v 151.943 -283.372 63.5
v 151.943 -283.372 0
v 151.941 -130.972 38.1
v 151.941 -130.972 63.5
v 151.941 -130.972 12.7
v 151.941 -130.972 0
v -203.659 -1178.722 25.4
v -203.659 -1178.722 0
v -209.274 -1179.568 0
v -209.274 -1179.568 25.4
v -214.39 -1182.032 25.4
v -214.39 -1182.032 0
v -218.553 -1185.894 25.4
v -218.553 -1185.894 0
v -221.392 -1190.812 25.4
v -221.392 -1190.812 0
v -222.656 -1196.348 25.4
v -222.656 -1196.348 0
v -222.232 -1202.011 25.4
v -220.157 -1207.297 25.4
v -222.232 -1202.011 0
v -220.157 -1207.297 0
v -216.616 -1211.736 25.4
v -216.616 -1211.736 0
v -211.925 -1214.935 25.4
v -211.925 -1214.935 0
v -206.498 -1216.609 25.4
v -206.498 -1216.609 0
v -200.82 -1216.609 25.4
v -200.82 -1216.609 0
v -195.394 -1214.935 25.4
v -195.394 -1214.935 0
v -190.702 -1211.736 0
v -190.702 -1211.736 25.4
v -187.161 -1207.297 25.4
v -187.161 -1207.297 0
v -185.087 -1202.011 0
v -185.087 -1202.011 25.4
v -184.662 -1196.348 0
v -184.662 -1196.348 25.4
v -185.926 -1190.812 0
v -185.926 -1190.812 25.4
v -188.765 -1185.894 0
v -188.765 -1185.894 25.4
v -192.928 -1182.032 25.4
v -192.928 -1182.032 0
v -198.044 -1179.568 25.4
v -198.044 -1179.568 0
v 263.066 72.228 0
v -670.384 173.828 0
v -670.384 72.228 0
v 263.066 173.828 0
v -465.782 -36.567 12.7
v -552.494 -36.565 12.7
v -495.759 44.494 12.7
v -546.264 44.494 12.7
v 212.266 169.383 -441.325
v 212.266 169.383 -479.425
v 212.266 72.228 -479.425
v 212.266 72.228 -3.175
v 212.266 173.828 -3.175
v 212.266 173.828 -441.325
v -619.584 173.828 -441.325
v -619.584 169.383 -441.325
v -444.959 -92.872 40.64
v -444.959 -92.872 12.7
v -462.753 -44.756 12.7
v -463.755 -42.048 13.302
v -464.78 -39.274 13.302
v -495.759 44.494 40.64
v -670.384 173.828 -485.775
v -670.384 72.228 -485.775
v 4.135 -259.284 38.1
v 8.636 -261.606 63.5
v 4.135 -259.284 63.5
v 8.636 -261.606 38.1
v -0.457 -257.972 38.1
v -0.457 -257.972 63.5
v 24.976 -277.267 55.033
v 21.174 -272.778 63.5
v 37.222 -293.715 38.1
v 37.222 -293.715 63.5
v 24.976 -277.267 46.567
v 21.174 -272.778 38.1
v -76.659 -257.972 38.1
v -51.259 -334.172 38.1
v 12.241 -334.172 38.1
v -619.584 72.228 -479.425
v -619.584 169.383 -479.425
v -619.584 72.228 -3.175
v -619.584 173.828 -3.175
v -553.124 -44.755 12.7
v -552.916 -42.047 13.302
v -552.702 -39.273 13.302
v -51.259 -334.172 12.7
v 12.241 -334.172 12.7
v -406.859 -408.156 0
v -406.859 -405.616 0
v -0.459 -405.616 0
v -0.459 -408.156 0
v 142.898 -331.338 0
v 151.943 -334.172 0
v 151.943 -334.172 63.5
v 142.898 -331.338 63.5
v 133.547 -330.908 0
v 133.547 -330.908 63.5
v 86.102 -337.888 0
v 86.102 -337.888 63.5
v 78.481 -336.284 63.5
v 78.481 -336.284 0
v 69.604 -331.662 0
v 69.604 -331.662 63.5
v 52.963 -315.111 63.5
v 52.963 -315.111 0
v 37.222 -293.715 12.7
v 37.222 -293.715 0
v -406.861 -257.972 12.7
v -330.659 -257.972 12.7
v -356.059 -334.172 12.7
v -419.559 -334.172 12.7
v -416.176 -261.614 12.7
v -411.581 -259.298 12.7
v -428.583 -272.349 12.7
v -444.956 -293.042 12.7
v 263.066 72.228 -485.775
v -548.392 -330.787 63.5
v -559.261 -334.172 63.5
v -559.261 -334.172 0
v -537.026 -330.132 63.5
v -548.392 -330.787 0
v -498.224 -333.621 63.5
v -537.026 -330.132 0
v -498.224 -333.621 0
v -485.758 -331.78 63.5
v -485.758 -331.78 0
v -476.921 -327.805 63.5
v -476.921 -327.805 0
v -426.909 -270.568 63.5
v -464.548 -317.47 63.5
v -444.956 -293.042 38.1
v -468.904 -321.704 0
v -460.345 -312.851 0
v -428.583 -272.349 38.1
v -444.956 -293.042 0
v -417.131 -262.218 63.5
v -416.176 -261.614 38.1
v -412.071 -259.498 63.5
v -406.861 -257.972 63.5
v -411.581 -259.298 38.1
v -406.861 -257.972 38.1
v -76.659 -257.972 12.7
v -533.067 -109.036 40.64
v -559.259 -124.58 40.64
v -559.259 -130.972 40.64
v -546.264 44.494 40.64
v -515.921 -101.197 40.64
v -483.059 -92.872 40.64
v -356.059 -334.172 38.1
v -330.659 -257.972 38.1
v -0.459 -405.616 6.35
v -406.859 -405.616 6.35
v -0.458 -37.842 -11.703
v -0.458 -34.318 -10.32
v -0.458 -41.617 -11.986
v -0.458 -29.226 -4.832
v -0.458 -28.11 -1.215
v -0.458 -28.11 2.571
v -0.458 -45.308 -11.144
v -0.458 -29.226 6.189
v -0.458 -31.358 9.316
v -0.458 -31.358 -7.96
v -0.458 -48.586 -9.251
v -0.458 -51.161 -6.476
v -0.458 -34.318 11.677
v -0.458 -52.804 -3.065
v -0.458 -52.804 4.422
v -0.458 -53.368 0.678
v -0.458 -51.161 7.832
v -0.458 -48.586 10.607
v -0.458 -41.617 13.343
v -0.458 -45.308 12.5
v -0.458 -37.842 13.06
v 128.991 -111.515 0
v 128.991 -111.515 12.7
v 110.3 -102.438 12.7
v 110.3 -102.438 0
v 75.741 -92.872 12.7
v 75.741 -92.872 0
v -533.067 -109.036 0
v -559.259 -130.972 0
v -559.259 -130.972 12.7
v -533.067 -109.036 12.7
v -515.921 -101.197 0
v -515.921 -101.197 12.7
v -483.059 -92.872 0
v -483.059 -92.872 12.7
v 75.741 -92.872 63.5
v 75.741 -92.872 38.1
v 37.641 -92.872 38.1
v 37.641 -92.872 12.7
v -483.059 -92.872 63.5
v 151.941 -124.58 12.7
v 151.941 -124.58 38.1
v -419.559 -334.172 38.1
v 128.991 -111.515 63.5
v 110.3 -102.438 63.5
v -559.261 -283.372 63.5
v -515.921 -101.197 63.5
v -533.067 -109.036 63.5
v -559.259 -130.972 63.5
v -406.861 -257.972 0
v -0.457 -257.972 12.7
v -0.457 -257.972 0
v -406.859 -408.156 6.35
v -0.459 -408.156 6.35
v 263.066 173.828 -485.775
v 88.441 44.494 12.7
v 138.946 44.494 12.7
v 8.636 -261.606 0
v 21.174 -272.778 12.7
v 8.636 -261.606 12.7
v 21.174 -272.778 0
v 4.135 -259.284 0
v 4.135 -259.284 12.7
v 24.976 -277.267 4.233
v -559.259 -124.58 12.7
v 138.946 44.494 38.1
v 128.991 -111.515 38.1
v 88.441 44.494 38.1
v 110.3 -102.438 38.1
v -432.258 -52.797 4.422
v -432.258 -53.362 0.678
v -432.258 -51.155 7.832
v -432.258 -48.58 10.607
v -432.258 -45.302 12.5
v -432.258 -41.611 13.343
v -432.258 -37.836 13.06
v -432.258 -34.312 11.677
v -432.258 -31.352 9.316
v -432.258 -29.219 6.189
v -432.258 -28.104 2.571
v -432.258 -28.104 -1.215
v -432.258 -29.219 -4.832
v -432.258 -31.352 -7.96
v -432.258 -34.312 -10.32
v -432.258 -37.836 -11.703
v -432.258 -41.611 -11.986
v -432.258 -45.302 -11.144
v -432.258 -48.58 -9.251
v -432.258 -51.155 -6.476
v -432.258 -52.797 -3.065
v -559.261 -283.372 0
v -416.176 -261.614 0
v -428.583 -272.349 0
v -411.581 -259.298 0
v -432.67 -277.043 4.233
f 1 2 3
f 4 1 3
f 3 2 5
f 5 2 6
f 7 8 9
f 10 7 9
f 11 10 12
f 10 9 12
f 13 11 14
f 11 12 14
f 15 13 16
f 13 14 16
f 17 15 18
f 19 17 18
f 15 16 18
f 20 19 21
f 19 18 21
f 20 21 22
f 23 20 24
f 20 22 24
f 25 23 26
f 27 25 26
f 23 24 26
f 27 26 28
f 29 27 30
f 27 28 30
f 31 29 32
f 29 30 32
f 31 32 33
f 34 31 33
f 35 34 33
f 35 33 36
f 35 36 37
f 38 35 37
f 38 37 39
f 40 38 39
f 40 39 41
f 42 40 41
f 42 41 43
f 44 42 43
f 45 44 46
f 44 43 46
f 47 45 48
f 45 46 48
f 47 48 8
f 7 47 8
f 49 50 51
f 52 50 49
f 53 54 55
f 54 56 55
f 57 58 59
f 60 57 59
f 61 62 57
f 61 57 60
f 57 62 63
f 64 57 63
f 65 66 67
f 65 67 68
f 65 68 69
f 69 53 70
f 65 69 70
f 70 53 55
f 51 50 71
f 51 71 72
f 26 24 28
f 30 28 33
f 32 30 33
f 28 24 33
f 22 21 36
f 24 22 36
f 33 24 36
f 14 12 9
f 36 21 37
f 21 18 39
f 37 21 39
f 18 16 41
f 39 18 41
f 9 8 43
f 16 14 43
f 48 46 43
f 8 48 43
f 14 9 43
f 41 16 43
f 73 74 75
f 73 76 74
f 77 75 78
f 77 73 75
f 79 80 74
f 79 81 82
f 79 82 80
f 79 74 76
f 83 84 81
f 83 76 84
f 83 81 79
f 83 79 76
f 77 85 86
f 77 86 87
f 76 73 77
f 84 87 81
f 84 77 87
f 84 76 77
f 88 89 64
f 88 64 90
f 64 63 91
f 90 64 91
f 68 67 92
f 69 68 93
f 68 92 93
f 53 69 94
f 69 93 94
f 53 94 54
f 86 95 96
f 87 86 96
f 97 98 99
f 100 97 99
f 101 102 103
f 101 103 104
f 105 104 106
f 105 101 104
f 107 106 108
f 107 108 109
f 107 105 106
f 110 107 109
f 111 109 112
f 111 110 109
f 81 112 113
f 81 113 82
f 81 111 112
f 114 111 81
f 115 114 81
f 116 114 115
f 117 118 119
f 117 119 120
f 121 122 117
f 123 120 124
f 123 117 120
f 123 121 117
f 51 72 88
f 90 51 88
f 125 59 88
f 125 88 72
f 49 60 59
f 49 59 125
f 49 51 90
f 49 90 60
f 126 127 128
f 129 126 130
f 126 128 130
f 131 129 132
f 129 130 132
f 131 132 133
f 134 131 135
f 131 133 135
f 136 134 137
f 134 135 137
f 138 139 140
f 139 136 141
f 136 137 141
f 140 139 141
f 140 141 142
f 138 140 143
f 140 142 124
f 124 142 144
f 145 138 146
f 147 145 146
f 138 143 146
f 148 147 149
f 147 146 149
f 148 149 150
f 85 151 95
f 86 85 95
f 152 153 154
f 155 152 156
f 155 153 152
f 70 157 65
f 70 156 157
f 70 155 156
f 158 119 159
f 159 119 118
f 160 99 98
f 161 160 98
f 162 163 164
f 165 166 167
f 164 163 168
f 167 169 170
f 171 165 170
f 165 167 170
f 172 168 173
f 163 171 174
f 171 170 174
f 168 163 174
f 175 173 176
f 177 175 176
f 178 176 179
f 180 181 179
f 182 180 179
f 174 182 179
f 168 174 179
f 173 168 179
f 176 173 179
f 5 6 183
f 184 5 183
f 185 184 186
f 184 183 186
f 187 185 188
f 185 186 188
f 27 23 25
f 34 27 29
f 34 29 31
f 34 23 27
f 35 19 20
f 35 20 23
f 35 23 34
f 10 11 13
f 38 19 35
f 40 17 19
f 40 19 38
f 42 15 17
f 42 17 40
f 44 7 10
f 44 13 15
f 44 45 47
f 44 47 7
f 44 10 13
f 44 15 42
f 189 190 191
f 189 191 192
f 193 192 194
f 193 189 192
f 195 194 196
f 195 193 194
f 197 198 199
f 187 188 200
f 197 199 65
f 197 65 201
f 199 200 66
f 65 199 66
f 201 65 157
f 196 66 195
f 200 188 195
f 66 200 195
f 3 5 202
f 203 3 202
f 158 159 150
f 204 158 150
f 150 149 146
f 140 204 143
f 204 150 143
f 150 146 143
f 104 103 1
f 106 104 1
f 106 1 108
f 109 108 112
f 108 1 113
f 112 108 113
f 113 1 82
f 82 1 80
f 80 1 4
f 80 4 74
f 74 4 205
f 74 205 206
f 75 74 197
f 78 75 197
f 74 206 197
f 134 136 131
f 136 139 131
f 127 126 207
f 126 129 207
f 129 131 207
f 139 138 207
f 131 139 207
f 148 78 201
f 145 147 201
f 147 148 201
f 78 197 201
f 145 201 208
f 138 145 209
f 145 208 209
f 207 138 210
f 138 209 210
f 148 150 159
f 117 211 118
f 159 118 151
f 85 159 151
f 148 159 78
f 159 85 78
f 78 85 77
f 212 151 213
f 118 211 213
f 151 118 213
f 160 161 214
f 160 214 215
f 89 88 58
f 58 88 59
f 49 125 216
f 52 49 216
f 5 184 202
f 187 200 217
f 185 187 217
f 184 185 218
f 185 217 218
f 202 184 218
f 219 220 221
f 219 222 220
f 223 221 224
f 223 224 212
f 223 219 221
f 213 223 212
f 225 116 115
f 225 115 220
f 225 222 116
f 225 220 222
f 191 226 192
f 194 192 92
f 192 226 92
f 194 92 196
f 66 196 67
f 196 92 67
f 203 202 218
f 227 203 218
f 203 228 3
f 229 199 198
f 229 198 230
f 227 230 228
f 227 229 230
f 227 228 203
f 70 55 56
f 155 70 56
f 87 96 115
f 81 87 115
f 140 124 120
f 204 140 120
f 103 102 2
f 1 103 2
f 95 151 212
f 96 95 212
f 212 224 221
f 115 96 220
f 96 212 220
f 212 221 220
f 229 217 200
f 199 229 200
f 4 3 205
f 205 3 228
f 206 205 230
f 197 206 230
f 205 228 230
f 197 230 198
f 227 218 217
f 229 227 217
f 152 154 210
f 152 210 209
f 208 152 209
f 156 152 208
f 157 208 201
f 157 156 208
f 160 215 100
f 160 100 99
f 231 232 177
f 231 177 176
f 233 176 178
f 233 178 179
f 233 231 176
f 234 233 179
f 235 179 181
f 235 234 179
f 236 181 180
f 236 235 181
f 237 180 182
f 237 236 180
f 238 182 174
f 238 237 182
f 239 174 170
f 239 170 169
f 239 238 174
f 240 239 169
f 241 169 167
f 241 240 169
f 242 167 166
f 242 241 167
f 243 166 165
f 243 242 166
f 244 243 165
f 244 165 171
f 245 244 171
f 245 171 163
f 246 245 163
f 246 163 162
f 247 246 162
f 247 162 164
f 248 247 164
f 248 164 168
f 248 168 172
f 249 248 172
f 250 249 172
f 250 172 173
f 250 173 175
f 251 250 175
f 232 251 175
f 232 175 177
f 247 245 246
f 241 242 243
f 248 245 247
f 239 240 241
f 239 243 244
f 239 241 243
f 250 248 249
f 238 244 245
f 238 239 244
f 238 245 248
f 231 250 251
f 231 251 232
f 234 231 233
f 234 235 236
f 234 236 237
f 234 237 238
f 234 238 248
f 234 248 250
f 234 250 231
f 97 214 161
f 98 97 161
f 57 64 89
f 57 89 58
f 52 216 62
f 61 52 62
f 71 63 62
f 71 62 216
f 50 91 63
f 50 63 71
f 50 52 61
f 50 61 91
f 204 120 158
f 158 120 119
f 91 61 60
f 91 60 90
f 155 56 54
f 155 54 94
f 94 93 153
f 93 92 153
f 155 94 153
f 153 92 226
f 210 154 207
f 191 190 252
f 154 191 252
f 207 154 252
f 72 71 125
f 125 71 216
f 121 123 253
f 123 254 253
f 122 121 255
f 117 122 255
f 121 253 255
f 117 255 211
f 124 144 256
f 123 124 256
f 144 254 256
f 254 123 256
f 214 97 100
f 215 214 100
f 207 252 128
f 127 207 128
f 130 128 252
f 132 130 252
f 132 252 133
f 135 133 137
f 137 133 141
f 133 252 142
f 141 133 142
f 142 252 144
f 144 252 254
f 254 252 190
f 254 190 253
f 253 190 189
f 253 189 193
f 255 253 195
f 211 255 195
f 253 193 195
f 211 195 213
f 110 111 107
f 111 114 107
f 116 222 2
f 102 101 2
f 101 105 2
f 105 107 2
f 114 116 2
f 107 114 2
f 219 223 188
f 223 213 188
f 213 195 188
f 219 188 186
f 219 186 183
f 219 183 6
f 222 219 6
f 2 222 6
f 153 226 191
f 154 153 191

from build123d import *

# Parameters (mm, degrees)
F1_DEPTH  = 63.5
F2_DEPTH  = 38.1
F3_DEPTH  = 12.7
F4_DEPTH  = 40.64
F5_DEPTH  = 12.7
F6_DEPTH  = 38.1
F7_DEPTH  = 12.7
F8_R      = 12.7
F9_DEPTH  = 558.8
F10_DEPTH = 127
F11_DEPTH = 25.4
F0_W      = 203.2
F0_H      = 2.54
F12_DEPTH = 6.35
F13_DEPTH = 485.775
F14_W     = 831.85
F14_H     = 438.15
F15_DEPTH = 101.6
F16_W     = 831.85
F16_H     = 38.1
F17_DEPTH = 97.155


with BuildPart() as f1:
    # F0 (on Top) → F1 (new body)
    with BuildSketch(Plane.XY):
        with BuildLine():
            Line((37.6408246131, -92.8718266129), (-203.6591753869, -92.8718266129))
            Line((-203.6591753869, -92.8718266129), (-444.9591753869, -92.8718266129))
            Line((-444.9591753869, -92.8718266129), (-483.0591753869, -92.8718266129))
            add(Edge.make_bspline(
                [(-559.2591753869, -130.9718266129), (-546.2638541522, -118.4510277738), (-532.7831309209, -107.1088036139), (-512.914695692, -98.9972069738), (-483.0591753869, -92.8718266129)],
                knots=[0, 0, 0, 0, 0.4473487837, 1, 1, 1, 1], degree=3))
            Line((-559.2591753869, -130.9718266129), (-559.2613965273, -283.3718266265))
            Line((-559.2613965273, -283.3718266265), (-559.2613965273, -334.1718266265))
            add(Edge.make_bspline(
                [(-559.2613965273, -334.1718266265), (-534.6703545183, -322.2549836692), (-488.1022443355, -351.771769362), (-455.9218092576, -307.8945100815), (-444.9556249628, -293.0419546548)],
                knots=[0, 0, 0, 0, 0.468017134, 0.7185993108, 0.7185993108, 0.7185993108, 0.7185993108], degree=3))
            add(Edge.make_bspline(
                [(-444.9556249628, -293.0419546548), (-432.6407354621, -276.3627183803), (-420.647967606, -260.2482634048), (-406.8613965273, -257.9718266129)],
                knots=[0.7185993108, 0.7185993108, 0.7185993108, 0.7185993108, 1, 1, 1, 1], degree=3))
            Line((-406.8613965273, -257.9718266129), (-387.8091753869, -257.9718266129))
            Line((-387.8091753869, -257.9718266129), (-330.6591753869, -257.9718266129))
            Line((-330.6591753869, -257.9718266129), (-203.6591753869, -257.9718266129))
            Line((-203.6591753869, -257.9718266129), (-76.6591753869, -257.9718266129))
            Line((-76.6591753869, -257.9718266129), (-63.9591753869, -257.9718266129))
            Line((-63.9591753869, -257.9718266129), (-19.5091753869, -257.9718266129))
            Line((-19.5091753869, -257.9718266129), (-0.4569542466, -257.9718266129))
            add(Edge.make_bspline(
                [(37.2217993936, -293.7148213515), (24.9643426032, -276.4539964179), (12.9099595108, -260.1789696435), (-0.4569542466, -257.9718266129)],
                knots=[0.7271650273, 0.7271650273, 0.7271650273, 0.7271650273, 1, 1, 1, 1], degree=3))
            add(Edge.make_bspline(
                [(151.9430457534, -334.1718266265), (128.0174175424, -322.5774438452), (82.6413173416, -359.5323330165), (49.4333005429, -310.9109320226), (37.2217993936, -293.7148213515)],
                knots=[0, 0, 0, 0, 0.4553529672, 0.7271650273, 0.7271650273, 0.7271650273, 0.7271650273], degree=3))
            Line((151.9430457534, -334.1718266265), (151.9430457534, -283.3718266265))
            Line((151.9430457534, -283.3718266265), (151.9408246131, -130.9718265888))
            add(Edge.make_bspline(
                [(151.9408246131, -130.9718265888), (140.0118859632, -119.4784715188), (131.7584534195, -112.0598265057), (107.579450329, -99.4040756136), (75.7408246131, -92.8718266129)],
                knots=[0, 0, 0, 0, 0.4106398064, 1, 1, 1, 1], degree=3))
            Line((75.7408246131, -92.8718266129), (37.6408246131, -92.8718266129))
        make_face()
    extrude(amount=F1_DEPTH)

    # F0 (on Top) → F2 (join)
    with BuildSketch(Plane.XY):
        with BuildLine():
            add(Edge.make_bspline(
                [(-444.9556249628, -293.0419546548), (-432.6407354621, -276.3627183803), (-420.647967606, -260.2482634048), (-406.8613965273, -257.9718266129)],
                knots=[0.7185993108, 0.7185993108, 0.7185993108, 0.7185993108, 1, 1, 1, 1], degree=3))
            Line((-444.9556249628, -293.0419546548), (-419.5591753869, -334.1718266129))
            Line((-419.5591753869, -334.1718266129), (-387.8091753869, -334.1718266129))
            Line((-387.8091753869, -334.1718266129), (-387.8091753869, -257.9718266129))
            Line((-387.8091753869, -257.9718266129), (-406.8613965273, -257.9718266129))
        make_face()
        Polygon((-330.6591753869, -257.9718266129), (-387.8091753869, -257.9718266129), (-387.8091753869, -334.1718266129), (-356.0591753869, -334.1718266129), align=None)
        Polygon((-19.5091753869, -334.1718266129), (-19.5091753869, -257.9718266129), (-63.9591753869, -257.9718266129), (-76.6591753869, -257.9718266129), (-51.2591753869, -334.1718266129), align=None)
        with BuildLine():
            Line((12.2408246131, -334.1718266129), (37.2217993936, -293.7148213515))
            add(Edge.make_bspline(
                [(37.2217993936, -293.7148213515), (24.9643426032, -276.4539964179), (12.9099595108, -260.1789696435), (-0.4569542466, -257.9718266129)],
                knots=[0.7271650273, 0.7271650273, 0.7271650273, 0.7271650273, 1, 1, 1, 1], degree=3))
            Line((-0.4569542466, -257.9718266129), (-19.5091753869, -257.9718266129))
            Line((-19.5091753869, -257.9718266129), (-19.5091753869, -334.1718266129))
            Line((-19.5091753869, -334.1718266129), (12.2408246131, -334.1718266129))
        make_face()
    extrude(amount=F2_DEPTH)

    # F0 (on Top) → F3 (cut)
    with BuildSketch(Plane.XY):
        with BuildLine():
            add(Edge.make_bspline(
                [(-444.9556249628, -293.0419546548), (-432.6407354621, -276.3627183803), (-420.647967606, -260.2482634048), (-406.8613965273, -257.9718266129)],
                knots=[0.7185993108, 0.7185993108, 0.7185993108, 0.7185993108, 1, 1, 1, 1], degree=3))
            Line((-444.9556249628, -293.0419546548), (-419.5591753869, -334.1718266129))
            Line((-419.5591753869, -334.1718266129), (-387.8091753869, -334.1718266129))
            Line((-387.8091753869, -334.1718266129), (-387.8091753869, -257.9718266129))
            Line((-387.8091753869, -257.9718266129), (-406.8613965273, -257.9718266129))
        make_face()
        Polygon((-330.6591753869, -257.9718266129), (-387.8091753869, -257.9718266129), (-387.8091753869, -334.1718266129), (-356.0591753869, -334.1718266129), align=None)
        Polygon((-19.5091753869, -334.1718266129), (-19.5091753869, -257.9718266129), (-63.9591753869, -257.9718266129), (-76.6591753869, -257.9718266129), (-51.2591753869, -334.1718266129), align=None)
        with BuildLine():
            Line((12.2408246131, -334.1718266129), (37.2217993936, -293.7148213515))
            add(Edge.make_bspline(
                [(37.2217993936, -293.7148213515), (24.9643426032, -276.4539964179), (12.9099595108, -260.1789696435), (-0.4569542466, -257.9718266129)],
                knots=[0.7271650273, 0.7271650273, 0.7271650273, 0.7271650273, 1, 1, 1, 1], degree=3))
            Line((-0.4569542466, -257.9718266129), (-19.5091753869, -257.9718266129))
            Line((-19.5091753869, -257.9718266129), (-19.5091753869, -334.1718266129))
            Line((-19.5091753869, -334.1718266129), (12.2408246131, -334.1718266129))
        make_face()
    extrude(amount=F3_DEPTH, mode=Mode.SUBTRACT)

    # F0 (on Top) → F4 (join)
    with BuildSketch(Plane.XY):
        with BuildLine():
            Line((-483.0591753869, -92.8718266129), (-444.9591753869, -92.8718266129))
            Line((-444.9591753869, -92.8718266129), (-495.7591753869, 44.4939662702))
            Line((-495.7591753869, 44.4939662702), (-546.2638541522, 44.4939662702))
            Line((-546.2638541522, 44.4939662702), (-559.2591753869, -124.5802119374))
            Line((-559.2591753869, -124.5802119374), (-559.2591753869, -130.9718266129))
            add(Edge.make_bspline(
                [(-559.2591753869, -130.9718266129), (-546.2638541522, -118.4510277738), (-532.7831309209, -107.1088036139), (-512.914695692, -98.9972069738), (-483.0591753869, -92.8718266129)],
                knots=[0, 0, 0, 0, 0.4473487837, 1, 1, 1, 1], degree=3))
        make_face()
    extrude(amount=F4_DEPTH)

    # F0 (on Top) → F5 (cut)
    with BuildSketch(Plane.XY):
        with BuildLine():
            Line((-483.0591753869, -92.8718266129), (-444.9591753869, -92.8718266129))
            Line((-444.9591753869, -92.8718266129), (-495.7591753869, 44.4939662702))
            Line((-495.7591753869, 44.4939662702), (-546.2638541522, 44.4939662702))
            Line((-546.2638541522, 44.4939662702), (-559.2591753869, -124.5802119374))
            Line((-559.2591753869, -124.5802119374), (-559.2591753869, -130.9718266129))
            add(Edge.make_bspline(
                [(-559.2591753869, -130.9718266129), (-546.2638541522, -118.4510277738), (-532.7831309209, -107.1088036139), (-512.914695692, -98.9972069738), (-483.0591753869, -92.8718266129)],
                knots=[0, 0, 0, 0, 0.4473487837, 1, 1, 1, 1], degree=3))
        make_face()
    extrude(amount=F5_DEPTH, mode=Mode.SUBTRACT)

    # F0 (on Top) → F6 (join)
    with BuildSketch(Plane.XY):
        with BuildLine():
            Line((88.4408246131, 44.4939662702), (37.6408246131, -92.8718266129))
            Line((37.6408246131, -92.8718266129), (75.7408246131, -92.8718266129))
            add(Edge.make_bspline(
                [(151.9408246131, -130.9718265888), (140.0118859632, -119.4784715188), (131.7584534195, -112.0598265057), (107.579450329, -99.4040756136), (75.7408246131, -92.8718266129)],
                knots=[0, 0, 0, 0, 0.4106398064, 1, 1, 1, 1], degree=3))
            Line((151.9408246131, -130.9718265888), (151.9408246131, -124.5802119374))
            Line((151.9408246131, -124.5802119374), (138.9455033784, 44.4939662702))
            Line((138.9455033784, 44.4939662702), (88.4408246131, 44.4939662702))
        make_face()
    extrude(amount=F6_DEPTH)

    # F0 (on Top) → F7 (cut)
    with BuildSketch(Plane.XY):
        with BuildLine():
            Line((88.4408246131, 44.4939662702), (37.6408246131, -92.8718266129))
            Line((37.6408246131, -92.8718266129), (75.7408246131, -92.8718266129))
            add(Edge.make_bspline(
                [(151.9408246131, -130.9718265888), (140.0118859632, -119.4784715188), (131.7584534195, -112.0598265057), (107.579450329, -99.4040756136), (75.7408246131, -92.8718266129)],
                knots=[0, 0, 0, 0, 0.4106398064, 1, 1, 1, 1], degree=3))
            Line((151.9408246131, -130.9718265888), (151.9408246131, -124.5802119374))
            Line((151.9408246131, -124.5802119374), (138.9455033784, 44.4939662702))
            Line((138.9455033784, 44.4939662702), (88.4408246131, 44.4939662702))
        make_face()
    extrude(amount=F7_DEPTH, mode=Mode.SUBTRACT)

    # F8 (on face) → F9 (join)
    with BuildSketch(Plane(origin=(-559.2572664308, 0.0081508457, 0), x_dir=(-1.45744e-05, -0.9999999999, 0), z_dir=(-0.9999999999, 1.45744e-05, 0))):
        with Locations((40.6680181623, 0.678205397)):
            Circle(F8_R)
    extrude(amount=-F9_DEPTH)

    # F10 (cut): a face of the model
    f10_faces = [f1.faces().sort_by_distance(p)[0] for p in [
        (-559.2578591432, -40.6598673122, 0.678205397),
    ]]
    extrude(f10_faces, amount=-F10_DEPTH, mode=Mode.SUBTRACT)


with BuildPart() as f11:
    # F0 (on Top) → F11 (new body)
    with BuildSketch(Plane.XY):
        with BuildLine():
            ThreePointArc((-184.6091753869, -1197.7718266129), (-190.1887912053, -1184.3014424313), (-203.6591753869, -1178.7218266129))
            ThreePointArc((-203.6591753869, -1178.7218266129), (-217.1295595685, -1211.2422107946), (-184.6091753869, -1197.7718266129))
        make_face()
    extrude(amount=F11_DEPTH)


with BuildPart() as f12:
    # F0 (on Top) → F12 (new body)
    with BuildSketch(Plane.XY):
        with Locations((-305.2591753869, -406.8861642075)):
            Rectangle(F0_W, F0_H)
        with Locations((-102.0591753869, -406.8861642075)):
            Rectangle(F0_W, F0_H)
    extrude(amount=F12_DEPTH)


with BuildPart() as f13:
    # F0 (on Top) → F13 (new body)
    with BuildSketch(Plane.XY):
        Polygon((-670.3841753869, 72.2281733871), (-203.6591753869, 72.2281733871), (263.0658246131, 72.2281733871), (263.0658246131, 173.8281733871), (-670.3841753869, 173.8281733871), align=None)
    extrude(amount=-F13_DEPTH)

    # F14 (on face) → F15 (cut)
    with BuildSketch(Plane(origin=(0, 173.8281733871, 0), x_dir=(-1, 0, 0), z_dir=(0, 1, 0))):
        with Locations((203.6591753869, -222.25)):
            Rectangle(F14_W, F14_H)
    extrude(amount=-F15_DEPTH, mode=Mode.SUBTRACT)

    # F16 (on face) → F17 (cut)
    with BuildSketch(Plane.XZ.offset(-72.2281733871)):
        with Locations((-203.6591753869, -460.375)):
            Rectangle(F16_W, F16_H)
    extrude(amount=-F17_DEPTH, mode=Mode.SUBTRACT)


solid = Compound([f1.part, f11.part, f12.part, f13.part])
